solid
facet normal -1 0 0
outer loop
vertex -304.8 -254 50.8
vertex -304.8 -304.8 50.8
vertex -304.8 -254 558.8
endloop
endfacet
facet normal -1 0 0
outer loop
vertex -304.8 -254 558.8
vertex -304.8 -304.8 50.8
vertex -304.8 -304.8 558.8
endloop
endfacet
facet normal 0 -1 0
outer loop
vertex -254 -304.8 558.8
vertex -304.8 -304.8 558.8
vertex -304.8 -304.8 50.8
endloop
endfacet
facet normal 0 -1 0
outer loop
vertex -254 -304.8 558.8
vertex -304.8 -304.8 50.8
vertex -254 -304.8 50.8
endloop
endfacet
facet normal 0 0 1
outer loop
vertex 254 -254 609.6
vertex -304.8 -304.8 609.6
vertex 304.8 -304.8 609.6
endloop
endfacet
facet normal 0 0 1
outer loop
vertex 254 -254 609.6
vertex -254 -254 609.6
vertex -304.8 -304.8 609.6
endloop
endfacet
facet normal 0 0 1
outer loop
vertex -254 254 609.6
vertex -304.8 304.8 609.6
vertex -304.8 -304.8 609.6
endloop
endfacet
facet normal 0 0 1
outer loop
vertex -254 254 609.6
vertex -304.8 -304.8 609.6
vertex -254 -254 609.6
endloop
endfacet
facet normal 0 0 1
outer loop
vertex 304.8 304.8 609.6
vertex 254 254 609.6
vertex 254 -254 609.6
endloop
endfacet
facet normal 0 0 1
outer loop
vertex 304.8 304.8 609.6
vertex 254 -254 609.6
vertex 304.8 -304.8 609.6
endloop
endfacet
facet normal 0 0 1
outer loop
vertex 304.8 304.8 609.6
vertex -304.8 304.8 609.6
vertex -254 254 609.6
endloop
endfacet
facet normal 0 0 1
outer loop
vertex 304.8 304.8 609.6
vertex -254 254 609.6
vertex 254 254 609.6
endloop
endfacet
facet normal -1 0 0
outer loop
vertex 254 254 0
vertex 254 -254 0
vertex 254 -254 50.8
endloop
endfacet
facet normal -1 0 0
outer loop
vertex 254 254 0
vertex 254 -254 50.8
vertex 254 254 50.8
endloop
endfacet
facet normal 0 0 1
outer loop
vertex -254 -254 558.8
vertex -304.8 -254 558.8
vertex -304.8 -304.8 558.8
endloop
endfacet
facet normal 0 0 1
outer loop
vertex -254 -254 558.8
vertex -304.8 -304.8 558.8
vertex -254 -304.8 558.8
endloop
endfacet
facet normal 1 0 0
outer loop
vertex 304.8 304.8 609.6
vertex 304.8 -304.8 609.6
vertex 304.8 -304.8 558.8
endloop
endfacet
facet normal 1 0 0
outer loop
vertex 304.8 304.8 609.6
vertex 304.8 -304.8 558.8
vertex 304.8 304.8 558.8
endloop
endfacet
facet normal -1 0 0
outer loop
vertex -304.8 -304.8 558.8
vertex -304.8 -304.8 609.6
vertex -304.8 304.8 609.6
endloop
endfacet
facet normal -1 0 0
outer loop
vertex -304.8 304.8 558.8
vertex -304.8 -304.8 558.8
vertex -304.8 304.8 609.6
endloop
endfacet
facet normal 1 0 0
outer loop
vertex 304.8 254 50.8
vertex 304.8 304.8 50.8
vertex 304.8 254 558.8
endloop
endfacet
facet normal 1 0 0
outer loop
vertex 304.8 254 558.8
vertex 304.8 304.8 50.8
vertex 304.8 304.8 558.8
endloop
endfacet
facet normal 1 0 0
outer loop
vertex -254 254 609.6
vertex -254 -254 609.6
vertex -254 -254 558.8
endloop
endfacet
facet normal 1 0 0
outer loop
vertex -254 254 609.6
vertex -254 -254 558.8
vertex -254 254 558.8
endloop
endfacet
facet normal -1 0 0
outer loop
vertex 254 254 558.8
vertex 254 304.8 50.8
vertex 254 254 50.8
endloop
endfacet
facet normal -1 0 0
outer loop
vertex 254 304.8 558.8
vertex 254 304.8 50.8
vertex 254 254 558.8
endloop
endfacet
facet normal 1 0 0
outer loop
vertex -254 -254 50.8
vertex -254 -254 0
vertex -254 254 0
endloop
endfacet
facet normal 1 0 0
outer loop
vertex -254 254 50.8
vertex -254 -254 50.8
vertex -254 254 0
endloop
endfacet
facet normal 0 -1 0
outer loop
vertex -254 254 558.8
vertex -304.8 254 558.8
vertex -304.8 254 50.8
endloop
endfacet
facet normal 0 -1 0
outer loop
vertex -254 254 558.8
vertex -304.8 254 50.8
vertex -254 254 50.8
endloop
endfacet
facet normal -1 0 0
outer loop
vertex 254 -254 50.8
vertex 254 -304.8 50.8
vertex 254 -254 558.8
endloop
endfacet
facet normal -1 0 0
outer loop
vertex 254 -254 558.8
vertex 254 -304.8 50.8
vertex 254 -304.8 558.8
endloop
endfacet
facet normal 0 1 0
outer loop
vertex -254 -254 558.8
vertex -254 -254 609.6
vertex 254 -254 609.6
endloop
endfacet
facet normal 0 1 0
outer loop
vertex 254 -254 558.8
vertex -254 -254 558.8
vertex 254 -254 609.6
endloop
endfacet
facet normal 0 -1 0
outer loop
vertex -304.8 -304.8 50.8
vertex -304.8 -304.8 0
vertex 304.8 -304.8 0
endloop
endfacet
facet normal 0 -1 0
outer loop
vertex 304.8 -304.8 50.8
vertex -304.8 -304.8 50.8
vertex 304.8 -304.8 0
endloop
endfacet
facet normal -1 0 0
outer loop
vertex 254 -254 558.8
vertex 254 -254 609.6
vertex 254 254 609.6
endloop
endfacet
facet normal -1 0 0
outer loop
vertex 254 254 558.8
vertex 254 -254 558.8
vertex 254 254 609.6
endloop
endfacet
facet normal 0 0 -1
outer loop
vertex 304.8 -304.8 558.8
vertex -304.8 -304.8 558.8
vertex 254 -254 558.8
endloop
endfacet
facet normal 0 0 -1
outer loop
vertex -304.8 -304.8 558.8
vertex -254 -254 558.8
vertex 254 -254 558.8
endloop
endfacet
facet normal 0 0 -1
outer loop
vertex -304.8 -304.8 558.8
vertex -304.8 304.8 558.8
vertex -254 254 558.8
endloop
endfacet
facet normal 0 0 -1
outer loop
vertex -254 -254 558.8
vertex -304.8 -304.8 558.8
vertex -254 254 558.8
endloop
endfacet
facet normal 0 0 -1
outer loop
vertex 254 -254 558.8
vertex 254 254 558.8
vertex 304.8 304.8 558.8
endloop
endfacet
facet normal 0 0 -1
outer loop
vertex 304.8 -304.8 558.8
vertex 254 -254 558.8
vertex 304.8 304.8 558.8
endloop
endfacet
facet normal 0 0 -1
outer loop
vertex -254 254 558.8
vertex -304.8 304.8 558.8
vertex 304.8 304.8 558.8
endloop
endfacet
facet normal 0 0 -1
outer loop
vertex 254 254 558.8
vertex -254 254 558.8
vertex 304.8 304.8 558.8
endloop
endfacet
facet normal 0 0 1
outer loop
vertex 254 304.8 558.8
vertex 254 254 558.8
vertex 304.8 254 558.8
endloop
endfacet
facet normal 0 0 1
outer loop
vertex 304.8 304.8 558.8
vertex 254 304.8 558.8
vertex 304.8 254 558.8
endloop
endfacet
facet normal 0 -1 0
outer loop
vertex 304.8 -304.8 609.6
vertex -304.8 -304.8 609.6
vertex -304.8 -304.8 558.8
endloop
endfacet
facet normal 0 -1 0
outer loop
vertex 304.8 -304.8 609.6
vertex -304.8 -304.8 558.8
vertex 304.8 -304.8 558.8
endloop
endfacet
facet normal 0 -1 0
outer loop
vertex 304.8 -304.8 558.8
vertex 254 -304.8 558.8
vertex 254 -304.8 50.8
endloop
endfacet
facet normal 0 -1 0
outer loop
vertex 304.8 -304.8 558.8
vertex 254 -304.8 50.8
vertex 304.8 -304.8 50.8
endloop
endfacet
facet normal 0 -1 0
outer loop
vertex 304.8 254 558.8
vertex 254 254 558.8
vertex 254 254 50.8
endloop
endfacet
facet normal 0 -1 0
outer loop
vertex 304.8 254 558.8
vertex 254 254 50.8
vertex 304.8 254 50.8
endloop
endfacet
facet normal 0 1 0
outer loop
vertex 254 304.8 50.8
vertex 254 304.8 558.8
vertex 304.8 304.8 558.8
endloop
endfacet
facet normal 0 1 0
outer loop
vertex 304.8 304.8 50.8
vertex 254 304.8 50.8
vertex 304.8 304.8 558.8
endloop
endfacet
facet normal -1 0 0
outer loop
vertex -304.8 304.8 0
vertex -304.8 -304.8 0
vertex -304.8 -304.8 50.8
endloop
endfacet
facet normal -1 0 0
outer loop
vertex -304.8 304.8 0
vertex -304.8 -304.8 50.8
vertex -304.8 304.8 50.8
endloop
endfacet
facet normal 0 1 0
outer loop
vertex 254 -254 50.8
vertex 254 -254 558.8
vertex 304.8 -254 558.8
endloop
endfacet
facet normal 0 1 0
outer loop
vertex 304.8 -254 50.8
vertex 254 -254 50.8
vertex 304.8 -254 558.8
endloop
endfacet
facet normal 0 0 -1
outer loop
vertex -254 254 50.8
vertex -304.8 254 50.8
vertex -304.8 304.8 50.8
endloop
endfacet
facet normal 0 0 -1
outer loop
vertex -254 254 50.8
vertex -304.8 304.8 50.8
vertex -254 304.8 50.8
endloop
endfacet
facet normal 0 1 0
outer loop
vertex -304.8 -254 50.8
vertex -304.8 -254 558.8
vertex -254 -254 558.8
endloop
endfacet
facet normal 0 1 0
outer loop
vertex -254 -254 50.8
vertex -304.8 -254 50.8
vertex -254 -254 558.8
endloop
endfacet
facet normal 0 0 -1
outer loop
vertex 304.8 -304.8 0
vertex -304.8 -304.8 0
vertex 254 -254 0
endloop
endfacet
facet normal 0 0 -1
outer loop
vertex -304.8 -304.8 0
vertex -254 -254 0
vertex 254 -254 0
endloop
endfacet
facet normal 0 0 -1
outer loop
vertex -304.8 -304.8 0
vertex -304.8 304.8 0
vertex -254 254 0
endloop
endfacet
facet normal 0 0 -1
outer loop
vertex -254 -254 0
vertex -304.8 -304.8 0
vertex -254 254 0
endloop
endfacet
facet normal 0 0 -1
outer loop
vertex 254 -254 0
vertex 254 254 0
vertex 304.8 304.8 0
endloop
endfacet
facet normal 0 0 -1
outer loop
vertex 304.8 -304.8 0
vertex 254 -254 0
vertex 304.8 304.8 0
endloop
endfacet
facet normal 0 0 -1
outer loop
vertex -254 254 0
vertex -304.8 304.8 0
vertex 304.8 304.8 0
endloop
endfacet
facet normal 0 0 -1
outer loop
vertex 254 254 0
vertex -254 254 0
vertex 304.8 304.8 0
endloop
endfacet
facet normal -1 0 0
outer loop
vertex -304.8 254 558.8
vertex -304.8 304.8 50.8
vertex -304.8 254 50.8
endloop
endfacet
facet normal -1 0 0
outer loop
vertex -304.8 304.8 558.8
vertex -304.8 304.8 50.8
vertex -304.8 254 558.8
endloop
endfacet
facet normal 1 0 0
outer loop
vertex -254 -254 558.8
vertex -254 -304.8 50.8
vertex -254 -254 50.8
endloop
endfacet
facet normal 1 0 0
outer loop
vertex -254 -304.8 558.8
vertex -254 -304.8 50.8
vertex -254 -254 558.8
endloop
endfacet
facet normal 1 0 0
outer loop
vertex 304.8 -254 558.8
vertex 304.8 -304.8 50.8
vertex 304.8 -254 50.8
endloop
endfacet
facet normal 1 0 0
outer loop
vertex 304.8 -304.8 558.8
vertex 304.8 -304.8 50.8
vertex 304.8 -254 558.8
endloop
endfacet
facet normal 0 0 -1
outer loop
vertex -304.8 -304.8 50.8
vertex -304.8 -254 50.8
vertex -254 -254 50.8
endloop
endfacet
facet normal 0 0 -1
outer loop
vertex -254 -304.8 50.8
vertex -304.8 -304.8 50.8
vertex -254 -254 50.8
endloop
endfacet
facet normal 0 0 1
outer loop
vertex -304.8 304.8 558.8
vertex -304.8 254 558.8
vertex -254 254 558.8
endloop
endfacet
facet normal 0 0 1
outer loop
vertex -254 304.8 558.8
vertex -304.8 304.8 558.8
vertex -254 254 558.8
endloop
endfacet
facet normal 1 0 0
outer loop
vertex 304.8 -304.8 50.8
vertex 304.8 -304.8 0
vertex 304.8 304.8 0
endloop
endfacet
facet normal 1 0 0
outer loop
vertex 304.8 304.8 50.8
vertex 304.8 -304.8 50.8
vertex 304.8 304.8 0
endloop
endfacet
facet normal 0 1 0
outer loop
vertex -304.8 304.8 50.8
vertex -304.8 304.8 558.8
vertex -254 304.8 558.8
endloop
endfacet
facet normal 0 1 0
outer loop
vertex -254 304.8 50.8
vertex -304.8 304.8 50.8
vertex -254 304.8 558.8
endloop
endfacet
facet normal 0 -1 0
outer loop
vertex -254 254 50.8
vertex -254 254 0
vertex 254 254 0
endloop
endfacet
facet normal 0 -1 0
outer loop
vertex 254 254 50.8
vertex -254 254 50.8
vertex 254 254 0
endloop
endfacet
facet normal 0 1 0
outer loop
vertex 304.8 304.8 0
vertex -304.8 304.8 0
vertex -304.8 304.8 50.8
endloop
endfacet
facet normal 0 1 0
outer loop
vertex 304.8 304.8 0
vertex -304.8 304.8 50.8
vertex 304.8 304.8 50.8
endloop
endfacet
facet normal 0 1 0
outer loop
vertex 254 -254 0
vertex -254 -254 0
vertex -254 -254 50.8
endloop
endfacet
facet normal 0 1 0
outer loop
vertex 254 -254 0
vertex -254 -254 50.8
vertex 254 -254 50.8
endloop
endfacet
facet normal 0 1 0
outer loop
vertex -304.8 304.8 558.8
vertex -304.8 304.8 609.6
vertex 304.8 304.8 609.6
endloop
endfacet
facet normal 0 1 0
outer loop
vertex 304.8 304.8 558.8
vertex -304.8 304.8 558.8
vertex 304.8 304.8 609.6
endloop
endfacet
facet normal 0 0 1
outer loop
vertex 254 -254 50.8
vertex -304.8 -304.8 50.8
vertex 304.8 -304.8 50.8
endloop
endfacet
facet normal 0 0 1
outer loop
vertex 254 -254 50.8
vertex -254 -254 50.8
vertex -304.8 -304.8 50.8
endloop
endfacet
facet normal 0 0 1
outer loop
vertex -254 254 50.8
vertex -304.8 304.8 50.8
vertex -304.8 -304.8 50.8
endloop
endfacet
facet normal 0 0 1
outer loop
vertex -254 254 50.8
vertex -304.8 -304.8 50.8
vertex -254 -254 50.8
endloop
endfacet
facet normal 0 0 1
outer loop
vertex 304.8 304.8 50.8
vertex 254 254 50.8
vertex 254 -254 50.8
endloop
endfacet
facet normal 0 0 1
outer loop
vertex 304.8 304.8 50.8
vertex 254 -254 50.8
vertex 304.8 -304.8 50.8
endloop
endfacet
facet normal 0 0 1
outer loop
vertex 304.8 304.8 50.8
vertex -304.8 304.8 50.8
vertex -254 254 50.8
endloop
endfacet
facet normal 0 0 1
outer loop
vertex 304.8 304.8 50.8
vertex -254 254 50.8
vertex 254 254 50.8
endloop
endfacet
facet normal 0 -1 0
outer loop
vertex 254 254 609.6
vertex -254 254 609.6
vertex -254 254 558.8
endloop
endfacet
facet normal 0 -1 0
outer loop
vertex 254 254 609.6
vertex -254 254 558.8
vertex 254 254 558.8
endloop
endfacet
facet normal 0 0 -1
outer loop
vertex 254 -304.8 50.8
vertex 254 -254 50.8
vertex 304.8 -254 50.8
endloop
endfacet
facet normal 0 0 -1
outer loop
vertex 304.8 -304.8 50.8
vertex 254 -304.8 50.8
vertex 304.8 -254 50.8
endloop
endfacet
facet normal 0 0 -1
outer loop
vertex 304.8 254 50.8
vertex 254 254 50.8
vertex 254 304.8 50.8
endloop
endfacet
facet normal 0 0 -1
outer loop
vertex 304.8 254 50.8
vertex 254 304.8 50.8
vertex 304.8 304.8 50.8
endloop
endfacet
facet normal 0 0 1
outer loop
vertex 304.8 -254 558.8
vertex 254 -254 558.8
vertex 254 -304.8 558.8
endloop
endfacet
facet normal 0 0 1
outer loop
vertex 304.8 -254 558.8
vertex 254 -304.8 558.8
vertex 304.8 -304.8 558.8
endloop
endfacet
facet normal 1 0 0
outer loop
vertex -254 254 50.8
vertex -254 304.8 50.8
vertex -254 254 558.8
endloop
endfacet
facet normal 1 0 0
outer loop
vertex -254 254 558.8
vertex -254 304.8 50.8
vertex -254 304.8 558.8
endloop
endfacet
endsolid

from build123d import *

# Parameters (mm, degrees)
F0_W     = 609.6
F0_H     = 609.6
F0_W_2   = 508
F0_H_2   = 508
F1_DEPTH = 50.8
F4_W     = 50.8
F4_H     = 508
F5_DEPTH = 50.8


with BuildPart() as f1:
    # F0 (on Top) → F1 (new body)
    with BuildSketch(Plane.XY):
        Rectangle(F0_W, F0_H)
        Rectangle(F0_W_2, F0_H_2, mode=Mode.SUBTRACT)
    extrude(amount=F1_DEPTH)


with BuildPart() as f3_1:
    # F3: instance of F1
    add(f1.part.mirror(Plane.XY.offset(304.8)))


with BuildPart() as f5:
    # F4 (on face) → F5 (new body)
    with BuildSketch(Plane.XZ.offset(304.8)):
        with Locations((-279.4, 304.8)):
            Rectangle(F4_W, F4_H)
    extrude(amount=-F5_DEPTH)


with BuildPart() as f5b:
    # F4 (on face) → F5, piece 2 (new body)
    with BuildSketch(Plane.XZ.offset(304.8)):
        with Locations((279.4, 304.8)):
            Rectangle(F4_W, F4_H)
    extrude(amount=-F5_DEPTH)


with BuildPart() as f7_1:
    # F7: instance of F5b
    add(f5b.part.mirror(Plane(origin=(0, 0, 584.2), x_dir=(-1, 0, 0), z_dir=(0, 1, 0))))


with BuildPart() as f8_1:
    # F8: instance of F5
    add(f5.part.mirror(Plane(origin=(0, 0, 584.2), x_dir=(-1, 0, 0), z_dir=(0, 1, 0))))


solid = Compound([f1.part, f3_1.part, f5.part, f5b.part, f7_1.part, f8_1.part])
